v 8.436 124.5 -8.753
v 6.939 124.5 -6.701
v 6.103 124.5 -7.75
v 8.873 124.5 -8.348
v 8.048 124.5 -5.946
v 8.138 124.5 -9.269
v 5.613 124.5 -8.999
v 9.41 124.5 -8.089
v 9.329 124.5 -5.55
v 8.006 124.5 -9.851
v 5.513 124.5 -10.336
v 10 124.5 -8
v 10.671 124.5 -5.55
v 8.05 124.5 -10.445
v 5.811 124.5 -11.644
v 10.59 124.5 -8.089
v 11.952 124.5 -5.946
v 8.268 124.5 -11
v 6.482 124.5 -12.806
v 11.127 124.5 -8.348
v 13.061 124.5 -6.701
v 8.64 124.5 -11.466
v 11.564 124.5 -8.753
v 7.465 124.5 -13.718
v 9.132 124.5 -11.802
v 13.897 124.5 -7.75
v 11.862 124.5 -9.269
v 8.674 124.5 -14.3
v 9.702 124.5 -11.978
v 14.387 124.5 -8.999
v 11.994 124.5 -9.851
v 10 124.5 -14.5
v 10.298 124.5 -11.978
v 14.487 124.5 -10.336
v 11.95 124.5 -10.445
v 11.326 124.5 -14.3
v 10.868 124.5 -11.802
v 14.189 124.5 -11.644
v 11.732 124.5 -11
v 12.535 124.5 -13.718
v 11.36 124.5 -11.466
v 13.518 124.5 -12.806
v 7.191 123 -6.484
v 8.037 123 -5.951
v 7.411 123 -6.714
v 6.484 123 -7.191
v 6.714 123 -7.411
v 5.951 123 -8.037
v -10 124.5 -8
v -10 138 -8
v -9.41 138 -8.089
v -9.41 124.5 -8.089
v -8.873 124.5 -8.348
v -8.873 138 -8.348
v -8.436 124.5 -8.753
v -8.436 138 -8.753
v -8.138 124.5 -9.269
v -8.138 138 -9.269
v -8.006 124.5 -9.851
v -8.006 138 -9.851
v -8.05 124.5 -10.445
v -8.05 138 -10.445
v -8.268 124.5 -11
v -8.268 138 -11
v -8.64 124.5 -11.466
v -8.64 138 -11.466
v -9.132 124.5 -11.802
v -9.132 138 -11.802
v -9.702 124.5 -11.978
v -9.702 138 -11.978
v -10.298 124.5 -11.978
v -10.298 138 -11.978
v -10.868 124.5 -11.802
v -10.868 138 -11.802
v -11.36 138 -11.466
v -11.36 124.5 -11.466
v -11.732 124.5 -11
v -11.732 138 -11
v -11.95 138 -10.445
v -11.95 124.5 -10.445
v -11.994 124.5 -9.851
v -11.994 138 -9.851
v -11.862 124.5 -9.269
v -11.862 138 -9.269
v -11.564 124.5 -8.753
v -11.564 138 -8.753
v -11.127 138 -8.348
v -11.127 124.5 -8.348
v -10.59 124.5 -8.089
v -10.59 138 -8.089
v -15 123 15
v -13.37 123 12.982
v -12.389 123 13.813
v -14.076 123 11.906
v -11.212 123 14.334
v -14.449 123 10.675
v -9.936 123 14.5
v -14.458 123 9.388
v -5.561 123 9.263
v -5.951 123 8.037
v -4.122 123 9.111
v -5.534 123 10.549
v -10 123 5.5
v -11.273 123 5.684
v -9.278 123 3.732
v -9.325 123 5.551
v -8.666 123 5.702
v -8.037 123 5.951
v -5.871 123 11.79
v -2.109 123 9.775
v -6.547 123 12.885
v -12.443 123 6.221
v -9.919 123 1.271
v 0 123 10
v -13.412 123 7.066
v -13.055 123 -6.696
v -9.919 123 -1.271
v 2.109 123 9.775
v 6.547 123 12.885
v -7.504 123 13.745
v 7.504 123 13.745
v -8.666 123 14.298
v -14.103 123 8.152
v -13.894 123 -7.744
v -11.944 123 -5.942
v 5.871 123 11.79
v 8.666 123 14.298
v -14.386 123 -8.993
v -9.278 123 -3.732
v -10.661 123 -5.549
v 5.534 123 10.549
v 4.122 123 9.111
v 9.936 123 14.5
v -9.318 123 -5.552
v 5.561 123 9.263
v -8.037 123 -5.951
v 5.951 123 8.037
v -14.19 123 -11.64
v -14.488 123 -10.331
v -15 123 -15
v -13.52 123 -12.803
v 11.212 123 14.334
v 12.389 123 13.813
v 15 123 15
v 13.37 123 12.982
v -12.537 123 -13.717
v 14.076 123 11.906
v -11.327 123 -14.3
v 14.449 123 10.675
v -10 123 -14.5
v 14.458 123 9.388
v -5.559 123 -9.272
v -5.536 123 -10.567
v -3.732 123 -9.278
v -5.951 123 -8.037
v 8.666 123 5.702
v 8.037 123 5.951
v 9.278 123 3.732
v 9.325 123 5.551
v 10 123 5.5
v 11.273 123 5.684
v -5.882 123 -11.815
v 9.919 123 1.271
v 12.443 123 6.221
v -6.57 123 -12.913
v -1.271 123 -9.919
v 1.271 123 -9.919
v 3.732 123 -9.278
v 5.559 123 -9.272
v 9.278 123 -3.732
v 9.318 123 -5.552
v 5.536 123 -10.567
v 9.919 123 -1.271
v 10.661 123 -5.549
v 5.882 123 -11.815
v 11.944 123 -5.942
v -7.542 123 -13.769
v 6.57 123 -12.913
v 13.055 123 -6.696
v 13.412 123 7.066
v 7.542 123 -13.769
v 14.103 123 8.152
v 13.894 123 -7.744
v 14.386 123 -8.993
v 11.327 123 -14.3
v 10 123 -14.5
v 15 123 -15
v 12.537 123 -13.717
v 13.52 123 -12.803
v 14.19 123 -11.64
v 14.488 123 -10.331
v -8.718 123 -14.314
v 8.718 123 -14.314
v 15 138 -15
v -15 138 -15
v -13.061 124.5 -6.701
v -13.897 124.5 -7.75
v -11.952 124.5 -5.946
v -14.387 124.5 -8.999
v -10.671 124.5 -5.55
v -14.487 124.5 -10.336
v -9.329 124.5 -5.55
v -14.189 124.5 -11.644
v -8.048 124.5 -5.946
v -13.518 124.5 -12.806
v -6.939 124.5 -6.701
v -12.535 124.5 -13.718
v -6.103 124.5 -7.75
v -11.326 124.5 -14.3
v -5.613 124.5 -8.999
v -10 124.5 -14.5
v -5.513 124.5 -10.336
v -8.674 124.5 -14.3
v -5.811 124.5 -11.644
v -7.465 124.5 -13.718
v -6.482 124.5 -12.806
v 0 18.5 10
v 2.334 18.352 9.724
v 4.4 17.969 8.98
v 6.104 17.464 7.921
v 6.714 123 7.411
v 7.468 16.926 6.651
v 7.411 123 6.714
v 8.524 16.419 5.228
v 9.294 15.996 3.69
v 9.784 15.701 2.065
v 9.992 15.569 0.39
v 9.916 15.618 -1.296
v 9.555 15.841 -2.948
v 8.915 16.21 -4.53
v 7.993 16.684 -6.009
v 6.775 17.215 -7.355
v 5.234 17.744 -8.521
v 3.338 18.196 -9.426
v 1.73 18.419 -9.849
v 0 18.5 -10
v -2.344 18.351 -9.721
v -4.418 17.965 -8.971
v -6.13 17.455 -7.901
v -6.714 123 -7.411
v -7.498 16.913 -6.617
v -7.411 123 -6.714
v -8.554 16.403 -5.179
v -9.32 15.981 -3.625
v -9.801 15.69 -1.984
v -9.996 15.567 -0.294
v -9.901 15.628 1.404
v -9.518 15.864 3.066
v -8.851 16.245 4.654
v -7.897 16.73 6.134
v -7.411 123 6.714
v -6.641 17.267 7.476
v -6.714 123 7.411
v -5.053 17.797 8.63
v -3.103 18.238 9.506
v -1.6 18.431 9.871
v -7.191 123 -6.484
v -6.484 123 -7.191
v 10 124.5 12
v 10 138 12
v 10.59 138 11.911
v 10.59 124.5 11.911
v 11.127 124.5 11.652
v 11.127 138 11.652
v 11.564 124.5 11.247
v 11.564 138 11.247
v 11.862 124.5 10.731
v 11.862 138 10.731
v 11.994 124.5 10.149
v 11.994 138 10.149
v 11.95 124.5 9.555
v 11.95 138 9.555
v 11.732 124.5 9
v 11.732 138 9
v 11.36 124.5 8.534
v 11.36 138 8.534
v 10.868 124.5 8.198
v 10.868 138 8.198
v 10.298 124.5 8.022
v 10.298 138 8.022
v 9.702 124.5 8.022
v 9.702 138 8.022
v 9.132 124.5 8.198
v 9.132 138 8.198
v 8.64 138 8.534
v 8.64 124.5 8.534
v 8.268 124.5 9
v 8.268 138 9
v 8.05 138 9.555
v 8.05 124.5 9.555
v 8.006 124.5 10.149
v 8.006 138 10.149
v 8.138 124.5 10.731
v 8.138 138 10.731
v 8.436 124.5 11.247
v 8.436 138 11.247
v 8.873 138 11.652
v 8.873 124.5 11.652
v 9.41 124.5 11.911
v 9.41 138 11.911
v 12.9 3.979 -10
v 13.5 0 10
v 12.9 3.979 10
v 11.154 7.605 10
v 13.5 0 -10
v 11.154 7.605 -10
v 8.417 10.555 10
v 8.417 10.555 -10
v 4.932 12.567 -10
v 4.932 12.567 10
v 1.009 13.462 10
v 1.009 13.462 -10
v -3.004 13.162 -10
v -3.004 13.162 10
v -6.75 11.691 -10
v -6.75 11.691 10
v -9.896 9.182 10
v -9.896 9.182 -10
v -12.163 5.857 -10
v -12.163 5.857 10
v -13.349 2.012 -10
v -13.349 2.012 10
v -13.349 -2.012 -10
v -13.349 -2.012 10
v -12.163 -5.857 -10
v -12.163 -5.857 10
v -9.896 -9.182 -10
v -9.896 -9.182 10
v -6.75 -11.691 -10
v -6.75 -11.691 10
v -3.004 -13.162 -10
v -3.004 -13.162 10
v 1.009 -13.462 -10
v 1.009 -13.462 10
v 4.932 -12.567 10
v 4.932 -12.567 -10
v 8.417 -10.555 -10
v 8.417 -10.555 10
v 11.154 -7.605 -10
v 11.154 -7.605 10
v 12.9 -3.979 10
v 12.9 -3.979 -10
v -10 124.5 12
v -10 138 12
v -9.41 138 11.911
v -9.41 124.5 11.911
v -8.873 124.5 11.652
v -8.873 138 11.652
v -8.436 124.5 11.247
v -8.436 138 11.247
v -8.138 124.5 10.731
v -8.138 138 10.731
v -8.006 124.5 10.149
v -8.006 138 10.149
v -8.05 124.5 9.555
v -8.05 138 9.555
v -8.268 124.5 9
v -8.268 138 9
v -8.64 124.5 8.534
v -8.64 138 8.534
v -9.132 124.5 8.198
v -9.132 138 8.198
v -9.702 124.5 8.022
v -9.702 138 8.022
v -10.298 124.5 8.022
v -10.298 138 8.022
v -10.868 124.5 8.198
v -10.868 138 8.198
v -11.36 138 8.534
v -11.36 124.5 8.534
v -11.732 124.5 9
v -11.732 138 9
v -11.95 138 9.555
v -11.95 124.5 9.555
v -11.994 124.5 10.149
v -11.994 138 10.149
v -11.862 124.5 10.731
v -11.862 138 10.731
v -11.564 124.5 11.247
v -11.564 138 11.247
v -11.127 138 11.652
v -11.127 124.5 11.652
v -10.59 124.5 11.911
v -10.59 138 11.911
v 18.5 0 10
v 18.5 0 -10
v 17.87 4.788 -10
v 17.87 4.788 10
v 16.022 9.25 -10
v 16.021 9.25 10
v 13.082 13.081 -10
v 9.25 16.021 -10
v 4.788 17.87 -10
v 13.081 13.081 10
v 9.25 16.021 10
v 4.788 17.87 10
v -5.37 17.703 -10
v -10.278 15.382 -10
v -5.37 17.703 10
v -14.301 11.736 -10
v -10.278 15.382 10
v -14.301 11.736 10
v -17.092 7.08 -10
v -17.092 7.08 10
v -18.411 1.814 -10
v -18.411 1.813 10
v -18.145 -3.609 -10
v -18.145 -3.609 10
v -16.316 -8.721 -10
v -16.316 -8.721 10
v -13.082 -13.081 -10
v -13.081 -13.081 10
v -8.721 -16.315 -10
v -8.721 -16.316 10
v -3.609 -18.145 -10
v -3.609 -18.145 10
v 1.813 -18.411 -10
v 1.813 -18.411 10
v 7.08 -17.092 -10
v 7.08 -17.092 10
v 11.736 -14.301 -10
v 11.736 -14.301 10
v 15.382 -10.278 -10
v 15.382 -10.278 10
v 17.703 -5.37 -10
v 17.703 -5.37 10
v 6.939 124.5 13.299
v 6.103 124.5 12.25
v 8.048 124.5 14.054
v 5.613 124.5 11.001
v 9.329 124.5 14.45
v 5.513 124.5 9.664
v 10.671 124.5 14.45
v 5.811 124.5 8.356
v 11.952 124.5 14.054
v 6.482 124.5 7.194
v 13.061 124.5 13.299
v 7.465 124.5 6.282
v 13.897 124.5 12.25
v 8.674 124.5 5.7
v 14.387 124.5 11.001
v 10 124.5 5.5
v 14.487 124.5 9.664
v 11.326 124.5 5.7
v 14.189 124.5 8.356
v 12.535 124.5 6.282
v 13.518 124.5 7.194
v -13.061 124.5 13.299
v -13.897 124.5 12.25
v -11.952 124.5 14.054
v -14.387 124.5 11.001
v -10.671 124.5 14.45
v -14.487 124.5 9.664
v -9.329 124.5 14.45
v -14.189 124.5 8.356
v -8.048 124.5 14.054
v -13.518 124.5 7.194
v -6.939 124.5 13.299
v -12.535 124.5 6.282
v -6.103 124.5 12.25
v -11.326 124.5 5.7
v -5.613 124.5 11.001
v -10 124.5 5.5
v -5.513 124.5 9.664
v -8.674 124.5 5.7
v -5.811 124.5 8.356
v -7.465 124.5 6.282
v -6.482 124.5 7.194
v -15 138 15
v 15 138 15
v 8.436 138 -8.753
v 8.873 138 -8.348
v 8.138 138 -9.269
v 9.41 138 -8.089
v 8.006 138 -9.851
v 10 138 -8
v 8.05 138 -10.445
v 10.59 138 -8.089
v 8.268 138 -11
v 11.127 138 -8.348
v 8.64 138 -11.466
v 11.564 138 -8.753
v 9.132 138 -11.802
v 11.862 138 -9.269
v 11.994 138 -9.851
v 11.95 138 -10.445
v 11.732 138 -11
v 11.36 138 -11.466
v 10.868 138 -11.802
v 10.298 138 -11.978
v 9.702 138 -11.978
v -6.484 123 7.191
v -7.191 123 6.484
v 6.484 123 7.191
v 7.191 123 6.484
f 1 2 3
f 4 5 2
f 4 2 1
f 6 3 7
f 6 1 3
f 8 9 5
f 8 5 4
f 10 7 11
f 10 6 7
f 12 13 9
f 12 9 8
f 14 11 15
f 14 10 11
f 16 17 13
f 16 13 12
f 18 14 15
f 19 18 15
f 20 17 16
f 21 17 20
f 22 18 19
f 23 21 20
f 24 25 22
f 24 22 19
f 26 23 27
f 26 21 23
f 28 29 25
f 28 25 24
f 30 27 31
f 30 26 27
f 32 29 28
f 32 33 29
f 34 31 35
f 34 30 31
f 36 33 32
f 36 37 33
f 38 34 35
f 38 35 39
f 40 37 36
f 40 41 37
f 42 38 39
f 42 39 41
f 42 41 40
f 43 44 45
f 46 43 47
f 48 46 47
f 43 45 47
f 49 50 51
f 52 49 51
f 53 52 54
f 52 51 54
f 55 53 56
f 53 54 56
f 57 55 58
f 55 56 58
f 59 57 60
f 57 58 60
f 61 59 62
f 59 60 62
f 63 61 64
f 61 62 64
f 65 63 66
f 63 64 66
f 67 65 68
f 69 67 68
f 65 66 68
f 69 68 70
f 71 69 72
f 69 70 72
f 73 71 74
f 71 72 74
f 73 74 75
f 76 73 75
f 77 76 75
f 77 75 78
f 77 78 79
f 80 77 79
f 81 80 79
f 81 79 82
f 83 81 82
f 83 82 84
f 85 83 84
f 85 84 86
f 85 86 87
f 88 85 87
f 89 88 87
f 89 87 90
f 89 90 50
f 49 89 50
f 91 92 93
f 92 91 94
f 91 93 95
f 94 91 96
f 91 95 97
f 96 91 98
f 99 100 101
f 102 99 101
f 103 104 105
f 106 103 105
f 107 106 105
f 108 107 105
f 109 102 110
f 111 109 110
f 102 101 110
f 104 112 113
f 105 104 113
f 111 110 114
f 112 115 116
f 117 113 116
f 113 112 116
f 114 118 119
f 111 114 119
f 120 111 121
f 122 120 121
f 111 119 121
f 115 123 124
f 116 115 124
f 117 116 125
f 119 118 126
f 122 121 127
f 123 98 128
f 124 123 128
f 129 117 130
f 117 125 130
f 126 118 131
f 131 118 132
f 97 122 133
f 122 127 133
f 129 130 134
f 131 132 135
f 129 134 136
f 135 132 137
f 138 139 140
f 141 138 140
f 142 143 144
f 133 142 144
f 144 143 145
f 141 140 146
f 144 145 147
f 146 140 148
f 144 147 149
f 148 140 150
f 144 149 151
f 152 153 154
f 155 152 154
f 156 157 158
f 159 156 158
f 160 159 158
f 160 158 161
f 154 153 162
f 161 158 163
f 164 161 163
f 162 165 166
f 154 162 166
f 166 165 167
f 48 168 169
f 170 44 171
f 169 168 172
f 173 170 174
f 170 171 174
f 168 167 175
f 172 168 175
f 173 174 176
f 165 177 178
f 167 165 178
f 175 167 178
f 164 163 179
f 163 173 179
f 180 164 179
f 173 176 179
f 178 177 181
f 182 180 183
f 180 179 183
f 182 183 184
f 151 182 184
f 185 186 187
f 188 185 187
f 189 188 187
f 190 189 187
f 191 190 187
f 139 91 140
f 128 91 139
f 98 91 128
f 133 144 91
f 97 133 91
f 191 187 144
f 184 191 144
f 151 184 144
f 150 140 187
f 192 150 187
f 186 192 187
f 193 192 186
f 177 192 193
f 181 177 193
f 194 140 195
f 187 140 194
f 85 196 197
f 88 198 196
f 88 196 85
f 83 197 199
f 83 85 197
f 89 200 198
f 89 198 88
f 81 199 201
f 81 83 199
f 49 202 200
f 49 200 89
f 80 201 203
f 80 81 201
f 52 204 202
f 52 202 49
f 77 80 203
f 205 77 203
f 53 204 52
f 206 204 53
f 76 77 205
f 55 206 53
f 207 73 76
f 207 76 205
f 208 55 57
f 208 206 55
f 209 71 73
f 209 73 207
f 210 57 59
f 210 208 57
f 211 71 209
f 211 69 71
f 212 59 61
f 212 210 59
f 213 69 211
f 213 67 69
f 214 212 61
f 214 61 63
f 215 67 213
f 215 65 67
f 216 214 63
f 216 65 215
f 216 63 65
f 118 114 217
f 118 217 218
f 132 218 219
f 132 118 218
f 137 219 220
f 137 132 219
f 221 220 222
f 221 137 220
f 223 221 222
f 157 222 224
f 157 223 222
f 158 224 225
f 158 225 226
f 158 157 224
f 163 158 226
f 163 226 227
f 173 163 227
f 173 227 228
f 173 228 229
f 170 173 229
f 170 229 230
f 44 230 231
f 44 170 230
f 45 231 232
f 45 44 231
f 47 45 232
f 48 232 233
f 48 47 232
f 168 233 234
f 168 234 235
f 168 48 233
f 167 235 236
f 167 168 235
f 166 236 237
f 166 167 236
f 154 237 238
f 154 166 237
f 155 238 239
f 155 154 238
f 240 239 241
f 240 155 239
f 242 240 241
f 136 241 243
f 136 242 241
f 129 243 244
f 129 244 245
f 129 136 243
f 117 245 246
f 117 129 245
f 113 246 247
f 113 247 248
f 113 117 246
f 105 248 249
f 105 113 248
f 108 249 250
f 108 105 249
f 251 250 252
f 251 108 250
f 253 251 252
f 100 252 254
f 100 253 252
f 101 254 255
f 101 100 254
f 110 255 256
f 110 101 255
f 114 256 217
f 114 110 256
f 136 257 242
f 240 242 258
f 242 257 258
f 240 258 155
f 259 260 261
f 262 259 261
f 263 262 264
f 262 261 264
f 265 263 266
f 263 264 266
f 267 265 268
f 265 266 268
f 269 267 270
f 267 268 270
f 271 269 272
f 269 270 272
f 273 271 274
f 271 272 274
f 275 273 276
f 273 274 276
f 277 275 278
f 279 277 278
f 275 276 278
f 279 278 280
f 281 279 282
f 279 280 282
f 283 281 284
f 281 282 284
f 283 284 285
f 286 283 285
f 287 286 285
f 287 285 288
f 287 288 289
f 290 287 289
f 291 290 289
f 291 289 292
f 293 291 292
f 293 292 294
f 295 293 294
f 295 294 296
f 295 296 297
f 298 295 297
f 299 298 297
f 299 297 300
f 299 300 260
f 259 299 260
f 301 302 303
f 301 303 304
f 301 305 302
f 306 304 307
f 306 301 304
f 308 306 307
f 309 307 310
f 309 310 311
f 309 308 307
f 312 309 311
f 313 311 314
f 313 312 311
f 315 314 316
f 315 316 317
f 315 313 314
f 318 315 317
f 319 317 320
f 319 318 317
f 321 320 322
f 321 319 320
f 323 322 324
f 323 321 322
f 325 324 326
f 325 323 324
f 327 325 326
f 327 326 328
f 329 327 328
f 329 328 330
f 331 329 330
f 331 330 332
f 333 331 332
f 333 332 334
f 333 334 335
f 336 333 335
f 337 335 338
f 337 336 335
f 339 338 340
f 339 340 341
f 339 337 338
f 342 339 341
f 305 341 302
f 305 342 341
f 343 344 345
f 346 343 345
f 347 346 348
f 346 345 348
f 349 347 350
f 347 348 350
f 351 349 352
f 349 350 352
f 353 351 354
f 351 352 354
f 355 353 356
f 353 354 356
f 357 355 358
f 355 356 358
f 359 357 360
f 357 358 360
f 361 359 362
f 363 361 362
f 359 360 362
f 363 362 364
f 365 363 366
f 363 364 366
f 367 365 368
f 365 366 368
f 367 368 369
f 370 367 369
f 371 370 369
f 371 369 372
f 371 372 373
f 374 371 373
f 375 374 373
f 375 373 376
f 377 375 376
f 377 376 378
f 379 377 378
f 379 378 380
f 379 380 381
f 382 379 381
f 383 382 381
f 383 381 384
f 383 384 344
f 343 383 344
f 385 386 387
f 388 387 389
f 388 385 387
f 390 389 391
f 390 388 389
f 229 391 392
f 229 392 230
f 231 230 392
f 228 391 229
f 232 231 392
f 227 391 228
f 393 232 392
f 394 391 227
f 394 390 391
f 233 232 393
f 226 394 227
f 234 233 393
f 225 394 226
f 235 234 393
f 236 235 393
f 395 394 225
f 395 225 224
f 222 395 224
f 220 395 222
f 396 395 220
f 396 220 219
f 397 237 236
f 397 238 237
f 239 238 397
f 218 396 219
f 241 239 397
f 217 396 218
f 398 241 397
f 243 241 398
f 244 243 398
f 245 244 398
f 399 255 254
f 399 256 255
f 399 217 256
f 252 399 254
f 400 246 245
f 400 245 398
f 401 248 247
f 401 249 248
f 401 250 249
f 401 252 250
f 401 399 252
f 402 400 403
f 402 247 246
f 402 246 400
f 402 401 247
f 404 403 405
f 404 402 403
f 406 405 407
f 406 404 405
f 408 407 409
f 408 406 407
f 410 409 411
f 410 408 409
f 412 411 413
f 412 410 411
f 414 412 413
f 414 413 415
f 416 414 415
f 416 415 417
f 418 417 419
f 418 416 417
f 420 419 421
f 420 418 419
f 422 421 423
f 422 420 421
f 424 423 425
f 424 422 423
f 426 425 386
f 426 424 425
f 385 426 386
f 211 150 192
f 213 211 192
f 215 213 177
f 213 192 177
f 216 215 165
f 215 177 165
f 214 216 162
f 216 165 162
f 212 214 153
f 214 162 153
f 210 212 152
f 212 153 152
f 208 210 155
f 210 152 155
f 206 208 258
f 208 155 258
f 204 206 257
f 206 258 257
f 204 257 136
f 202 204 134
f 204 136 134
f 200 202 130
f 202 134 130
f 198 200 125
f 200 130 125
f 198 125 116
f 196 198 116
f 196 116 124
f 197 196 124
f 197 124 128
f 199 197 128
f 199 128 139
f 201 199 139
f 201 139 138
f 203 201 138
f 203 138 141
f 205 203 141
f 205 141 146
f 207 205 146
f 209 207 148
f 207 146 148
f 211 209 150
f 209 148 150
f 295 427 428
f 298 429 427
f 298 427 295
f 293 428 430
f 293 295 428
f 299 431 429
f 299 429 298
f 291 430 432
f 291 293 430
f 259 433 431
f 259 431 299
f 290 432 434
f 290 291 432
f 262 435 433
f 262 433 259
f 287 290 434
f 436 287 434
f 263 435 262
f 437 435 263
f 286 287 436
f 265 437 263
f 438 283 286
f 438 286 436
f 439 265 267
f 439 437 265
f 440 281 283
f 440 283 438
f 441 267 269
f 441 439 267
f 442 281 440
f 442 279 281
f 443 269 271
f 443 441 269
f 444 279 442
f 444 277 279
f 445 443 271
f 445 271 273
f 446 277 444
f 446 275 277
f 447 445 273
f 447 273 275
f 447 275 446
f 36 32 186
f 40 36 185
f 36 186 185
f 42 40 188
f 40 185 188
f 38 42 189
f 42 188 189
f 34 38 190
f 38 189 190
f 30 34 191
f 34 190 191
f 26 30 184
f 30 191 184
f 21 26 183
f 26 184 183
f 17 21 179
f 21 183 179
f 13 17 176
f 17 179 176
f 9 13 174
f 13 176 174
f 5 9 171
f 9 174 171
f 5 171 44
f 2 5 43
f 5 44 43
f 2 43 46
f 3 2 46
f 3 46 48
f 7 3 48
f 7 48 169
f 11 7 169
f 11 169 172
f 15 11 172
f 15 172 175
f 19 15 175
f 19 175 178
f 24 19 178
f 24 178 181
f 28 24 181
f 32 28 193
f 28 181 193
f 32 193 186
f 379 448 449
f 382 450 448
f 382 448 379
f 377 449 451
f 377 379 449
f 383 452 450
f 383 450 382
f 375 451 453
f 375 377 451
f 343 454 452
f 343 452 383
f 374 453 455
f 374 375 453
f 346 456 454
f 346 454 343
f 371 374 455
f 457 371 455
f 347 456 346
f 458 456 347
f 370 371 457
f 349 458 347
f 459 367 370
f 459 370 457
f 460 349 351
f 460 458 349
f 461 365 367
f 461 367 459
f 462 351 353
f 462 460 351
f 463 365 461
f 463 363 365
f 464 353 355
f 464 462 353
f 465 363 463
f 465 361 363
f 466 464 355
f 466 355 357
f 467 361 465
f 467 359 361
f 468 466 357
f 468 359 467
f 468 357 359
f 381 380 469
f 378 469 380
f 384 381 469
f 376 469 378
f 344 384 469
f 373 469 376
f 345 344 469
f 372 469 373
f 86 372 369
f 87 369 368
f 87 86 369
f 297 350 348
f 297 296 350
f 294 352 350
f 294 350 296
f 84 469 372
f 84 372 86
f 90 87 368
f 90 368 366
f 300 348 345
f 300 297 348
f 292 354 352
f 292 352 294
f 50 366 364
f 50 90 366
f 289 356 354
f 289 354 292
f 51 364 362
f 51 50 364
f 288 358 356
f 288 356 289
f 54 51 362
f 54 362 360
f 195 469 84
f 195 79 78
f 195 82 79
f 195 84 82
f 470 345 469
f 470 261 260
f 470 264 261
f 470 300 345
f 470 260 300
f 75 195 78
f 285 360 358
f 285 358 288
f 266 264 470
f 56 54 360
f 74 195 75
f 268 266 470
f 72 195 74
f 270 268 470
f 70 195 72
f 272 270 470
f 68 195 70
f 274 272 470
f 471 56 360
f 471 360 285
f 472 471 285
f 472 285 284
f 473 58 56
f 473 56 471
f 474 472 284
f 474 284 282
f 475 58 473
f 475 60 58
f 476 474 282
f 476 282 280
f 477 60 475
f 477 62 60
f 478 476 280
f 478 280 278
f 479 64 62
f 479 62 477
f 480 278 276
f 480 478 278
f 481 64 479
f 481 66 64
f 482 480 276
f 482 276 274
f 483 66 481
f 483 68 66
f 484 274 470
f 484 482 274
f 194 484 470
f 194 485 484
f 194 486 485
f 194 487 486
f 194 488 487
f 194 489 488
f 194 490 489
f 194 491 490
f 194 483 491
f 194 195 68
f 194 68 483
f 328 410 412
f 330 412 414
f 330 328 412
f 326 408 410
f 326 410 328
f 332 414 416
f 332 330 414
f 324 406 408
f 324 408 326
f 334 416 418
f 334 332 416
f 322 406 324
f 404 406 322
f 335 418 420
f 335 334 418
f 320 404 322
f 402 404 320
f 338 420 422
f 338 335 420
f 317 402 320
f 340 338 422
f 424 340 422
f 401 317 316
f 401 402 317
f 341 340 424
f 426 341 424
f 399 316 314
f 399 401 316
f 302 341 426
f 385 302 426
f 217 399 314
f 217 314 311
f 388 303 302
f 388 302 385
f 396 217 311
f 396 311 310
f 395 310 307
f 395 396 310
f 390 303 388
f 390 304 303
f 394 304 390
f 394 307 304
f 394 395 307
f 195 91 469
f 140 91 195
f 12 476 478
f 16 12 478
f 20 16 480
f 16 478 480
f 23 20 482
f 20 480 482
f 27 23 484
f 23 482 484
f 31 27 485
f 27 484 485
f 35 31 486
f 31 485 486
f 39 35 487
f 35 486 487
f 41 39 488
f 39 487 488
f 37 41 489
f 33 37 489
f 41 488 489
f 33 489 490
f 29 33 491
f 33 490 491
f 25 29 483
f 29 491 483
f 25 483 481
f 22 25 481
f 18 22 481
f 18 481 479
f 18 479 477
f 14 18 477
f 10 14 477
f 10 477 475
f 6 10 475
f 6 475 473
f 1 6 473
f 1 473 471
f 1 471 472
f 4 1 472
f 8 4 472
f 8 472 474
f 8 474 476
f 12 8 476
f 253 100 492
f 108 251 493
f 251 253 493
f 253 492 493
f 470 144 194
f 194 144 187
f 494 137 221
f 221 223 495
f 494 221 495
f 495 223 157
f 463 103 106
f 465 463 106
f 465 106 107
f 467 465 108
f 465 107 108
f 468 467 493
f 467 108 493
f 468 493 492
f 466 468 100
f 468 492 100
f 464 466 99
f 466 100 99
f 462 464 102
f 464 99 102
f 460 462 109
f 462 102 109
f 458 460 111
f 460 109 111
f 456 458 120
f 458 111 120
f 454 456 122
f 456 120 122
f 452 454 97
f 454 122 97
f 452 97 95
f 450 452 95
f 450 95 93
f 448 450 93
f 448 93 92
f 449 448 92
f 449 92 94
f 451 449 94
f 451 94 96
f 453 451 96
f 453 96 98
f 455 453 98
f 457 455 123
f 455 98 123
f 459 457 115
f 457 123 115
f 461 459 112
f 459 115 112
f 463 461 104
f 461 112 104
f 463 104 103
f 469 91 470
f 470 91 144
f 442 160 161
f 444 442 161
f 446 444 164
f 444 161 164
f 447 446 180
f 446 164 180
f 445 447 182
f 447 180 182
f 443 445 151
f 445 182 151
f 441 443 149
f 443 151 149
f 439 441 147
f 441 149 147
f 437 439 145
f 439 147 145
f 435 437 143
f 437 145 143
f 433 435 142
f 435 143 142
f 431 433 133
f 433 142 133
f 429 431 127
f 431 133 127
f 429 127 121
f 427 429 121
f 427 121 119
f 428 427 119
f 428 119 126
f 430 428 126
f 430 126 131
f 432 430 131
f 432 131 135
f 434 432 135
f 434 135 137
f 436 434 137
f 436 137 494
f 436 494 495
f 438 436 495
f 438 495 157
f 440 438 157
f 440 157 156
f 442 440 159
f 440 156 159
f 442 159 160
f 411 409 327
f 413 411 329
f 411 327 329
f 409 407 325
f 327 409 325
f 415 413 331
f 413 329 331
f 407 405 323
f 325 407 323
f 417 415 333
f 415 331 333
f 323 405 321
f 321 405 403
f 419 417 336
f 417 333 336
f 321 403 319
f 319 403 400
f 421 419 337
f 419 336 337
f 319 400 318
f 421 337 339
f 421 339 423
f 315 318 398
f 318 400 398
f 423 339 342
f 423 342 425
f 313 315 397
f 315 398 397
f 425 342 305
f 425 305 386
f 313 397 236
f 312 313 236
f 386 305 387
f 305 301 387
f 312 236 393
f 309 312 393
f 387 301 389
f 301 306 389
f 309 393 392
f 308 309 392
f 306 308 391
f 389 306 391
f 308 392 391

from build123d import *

# Parameters (mm, degrees)
SKETCH_1_R           = 18.5
SKETCH_1_R_2         = 13.5
EXTRUDE_1_DEPTH      = 10
EXTRUDE_2_REACH      = 145.054
EXTRUDE_2_END_RADIUS = 18.5
SKETCH_3_R           = 10
SKETCH_4_W           = 30
SKETCH_4_H           = 30
EXTRUDE_3_DEPTH      = 15
SKETCH_5_R           = 2
CUT_EXTRUDE_1_DEPTH  = 15
SKETCH_6_R           = 4.5
CUT_EXTRUDE_2_DEPTH  = 1.5


with BuildPart() as part:
    # 草图1 → 凸台-拉伸1 (new, symmetric)
    with BuildSketch(Plane.XY):
        Circle(SKETCH_1_R)
        Circle(SKETCH_1_R_2, mode=Mode.SUBTRACT)
    extrude(amount=EXTRUDE_1_DEPTH, both=True)

    # 凸台-拉伸2: up to this cylinder (the profile starts outside it)
    extrude_2_end = Plane(origin=(0, 0, 0), z_dir=(0, 0, -1)) * Cylinder(EXTRUDE_2_END_RADIUS, 328.108, mode=Mode.PRIVATE)
    # 草图3 → 凸台-拉伸2 (add, up to the surface)
    with BuildSketch(Plane(origin=(0, 123, 0), x_dir=(1, 0, 0), z_dir=(0, 1, 0)), mode=Mode.PRIVATE) as extrude_2_sk1:
        with Locations(Location((0, 0, 0), (0, 0, 270))):
            Circle(SKETCH_3_R)
    extrude_2_tool1 = extrude(extrude_2_sk1.sketch, amount=-EXTRUDE_2_REACH, mode=Mode.PRIVATE) - extrude_2_end
    add(extrude_2_tool1.solids().sort_by_distance((0, 123, 0))[0])

    # 草图4 → 凸台-拉伸3 (add)
    with BuildSketch(Plane(origin=(0, 123, 0), x_dir=(1, 0, 0), z_dir=(0, 1, 0))):
        Rectangle(SKETCH_4_W, SKETCH_4_H)
    extrude(amount=EXTRUDE_3_DEPTH)

    # 草图5 → 切除-拉伸1 (cut)
    with BuildSketch(Plane(origin=(0, 138, 0), x_dir=(1, 0, 0), z_dir=(0, 1, 0))):
        with Locations(Location((-10, 10, 0), (0, 0, 270))):
            Circle(SKETCH_5_R)
        with Locations(Location((10, 10, 0), (0, 0, 270))):
            Circle(SKETCH_5_R)
        with Locations(Location((-10, -10, 0), (0, 0, 270))):
            Circle(SKETCH_5_R)
        with Locations(Location((10, -10, 0), (0, 0, 270))):
            Circle(SKETCH_5_R)
    extrude(amount=-CUT_EXTRUDE_1_DEPTH, mode=Mode.SUBTRACT)

    # 草图6 → 切除-拉伸2 (cut)
    with BuildSketch(Plane.XZ.offset(-123)):
        with Locations(Location((-10, -10, 0), (0, 0, 270))):
            Circle(SKETCH_6_R)
        with Locations(Location((-10, 10, 0), (0, 0, 270))):
            Circle(SKETCH_6_R)
        with Locations(Location((10, 10, 0), (0, 0, 270))):
            Circle(SKETCH_6_R)
        with Locations(Location((10, -10, 0), (0, 0, 270))):
            Circle(SKETCH_6_R)
    extrude(amount=-CUT_EXTRUDE_2_DEPTH, mode=Mode.SUBTRACT)


solid = part.part
